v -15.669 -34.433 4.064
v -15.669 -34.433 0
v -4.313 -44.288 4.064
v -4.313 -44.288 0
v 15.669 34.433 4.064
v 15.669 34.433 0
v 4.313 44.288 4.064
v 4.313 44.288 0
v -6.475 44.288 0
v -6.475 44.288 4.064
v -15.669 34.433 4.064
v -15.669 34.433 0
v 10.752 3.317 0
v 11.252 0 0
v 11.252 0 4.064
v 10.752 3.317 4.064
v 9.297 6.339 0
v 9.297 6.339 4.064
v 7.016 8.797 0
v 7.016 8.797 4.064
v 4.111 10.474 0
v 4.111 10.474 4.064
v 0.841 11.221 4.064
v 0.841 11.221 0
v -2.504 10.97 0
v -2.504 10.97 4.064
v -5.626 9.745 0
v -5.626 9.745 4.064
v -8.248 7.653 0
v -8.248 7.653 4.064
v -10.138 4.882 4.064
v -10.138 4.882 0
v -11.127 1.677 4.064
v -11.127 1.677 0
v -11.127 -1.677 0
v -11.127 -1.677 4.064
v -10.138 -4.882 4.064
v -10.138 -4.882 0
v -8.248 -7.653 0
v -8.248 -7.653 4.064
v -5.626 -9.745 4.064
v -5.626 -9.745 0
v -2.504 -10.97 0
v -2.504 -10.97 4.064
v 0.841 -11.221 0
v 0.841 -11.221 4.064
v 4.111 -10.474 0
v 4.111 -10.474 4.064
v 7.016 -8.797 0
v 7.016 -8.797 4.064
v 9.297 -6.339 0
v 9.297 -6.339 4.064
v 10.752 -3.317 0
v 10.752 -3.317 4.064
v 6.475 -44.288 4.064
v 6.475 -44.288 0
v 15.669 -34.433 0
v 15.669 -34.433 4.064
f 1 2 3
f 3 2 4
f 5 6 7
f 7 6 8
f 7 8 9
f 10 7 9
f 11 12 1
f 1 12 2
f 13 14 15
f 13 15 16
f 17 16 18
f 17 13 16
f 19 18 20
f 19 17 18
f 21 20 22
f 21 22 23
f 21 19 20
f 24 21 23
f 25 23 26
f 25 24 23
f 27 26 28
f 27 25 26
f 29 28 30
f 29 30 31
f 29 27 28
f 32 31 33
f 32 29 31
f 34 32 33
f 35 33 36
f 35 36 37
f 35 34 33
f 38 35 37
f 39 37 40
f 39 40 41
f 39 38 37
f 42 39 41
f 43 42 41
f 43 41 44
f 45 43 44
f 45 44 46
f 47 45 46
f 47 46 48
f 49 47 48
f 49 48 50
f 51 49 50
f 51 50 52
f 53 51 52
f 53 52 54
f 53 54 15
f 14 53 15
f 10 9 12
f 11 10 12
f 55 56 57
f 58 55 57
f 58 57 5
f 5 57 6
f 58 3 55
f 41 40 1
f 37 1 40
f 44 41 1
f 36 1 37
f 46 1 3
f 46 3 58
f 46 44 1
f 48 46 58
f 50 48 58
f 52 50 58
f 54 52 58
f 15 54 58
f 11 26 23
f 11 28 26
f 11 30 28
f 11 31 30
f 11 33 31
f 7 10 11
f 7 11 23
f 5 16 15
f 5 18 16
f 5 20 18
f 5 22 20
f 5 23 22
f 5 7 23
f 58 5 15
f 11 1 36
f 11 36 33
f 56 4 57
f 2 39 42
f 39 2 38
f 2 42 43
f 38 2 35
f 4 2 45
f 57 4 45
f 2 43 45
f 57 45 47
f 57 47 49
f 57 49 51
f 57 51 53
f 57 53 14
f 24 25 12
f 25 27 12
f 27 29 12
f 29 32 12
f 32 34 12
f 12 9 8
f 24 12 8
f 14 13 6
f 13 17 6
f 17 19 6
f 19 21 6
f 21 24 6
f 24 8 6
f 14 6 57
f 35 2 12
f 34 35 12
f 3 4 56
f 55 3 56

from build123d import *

# Parameters (mm, degrees)
F0_R     = 11.2522
F1_DEPTH = 4.064
F2_COUNT = 2


with BuildPart() as f1:
    # F0 (on Top) → F1 (new body)
    with BuildSketch(Plane.XY):
        with BuildLine():
            ThreePointArc((-15.669299, 0), (0, -15.669299), (15.669299, 0))
            ThreePointArc((15.669299, 0), (0, 15.669299), (-15.669299, 0))
        make_face()
        Circle(F0_R, mode=Mode.SUBTRACT)
        with BuildLine():
            Line((15.669299, -34.433249), (15.669299, 0))
            ThreePointArc((15.669299, 0), (0, -15.669299), (-15.669299, 0))
            Line((-15.669299, 0), (-15.669299, -34.433249))
            Line((-15.669299, -34.433249), (-4.313127, -44.288438))
            Line((-4.313127, -44.288438), (6.474976, -44.288438))
            Line((6.474976, -44.288438), (15.669299, -34.433249))
        make_face()
    extrude(amount=F1_DEPTH)

    # F2: F1 ×2 about axis
    f2_axis = Axis((0, 0, 4.064), (0, 0, 1))


with BuildPart() as f1_1:
    add(f1.part)
    for i in range(1, F2_COUNT):
        add(f1.part.rotate(f2_axis, i * 360 / F2_COUNT))


solid = f1_1.part
